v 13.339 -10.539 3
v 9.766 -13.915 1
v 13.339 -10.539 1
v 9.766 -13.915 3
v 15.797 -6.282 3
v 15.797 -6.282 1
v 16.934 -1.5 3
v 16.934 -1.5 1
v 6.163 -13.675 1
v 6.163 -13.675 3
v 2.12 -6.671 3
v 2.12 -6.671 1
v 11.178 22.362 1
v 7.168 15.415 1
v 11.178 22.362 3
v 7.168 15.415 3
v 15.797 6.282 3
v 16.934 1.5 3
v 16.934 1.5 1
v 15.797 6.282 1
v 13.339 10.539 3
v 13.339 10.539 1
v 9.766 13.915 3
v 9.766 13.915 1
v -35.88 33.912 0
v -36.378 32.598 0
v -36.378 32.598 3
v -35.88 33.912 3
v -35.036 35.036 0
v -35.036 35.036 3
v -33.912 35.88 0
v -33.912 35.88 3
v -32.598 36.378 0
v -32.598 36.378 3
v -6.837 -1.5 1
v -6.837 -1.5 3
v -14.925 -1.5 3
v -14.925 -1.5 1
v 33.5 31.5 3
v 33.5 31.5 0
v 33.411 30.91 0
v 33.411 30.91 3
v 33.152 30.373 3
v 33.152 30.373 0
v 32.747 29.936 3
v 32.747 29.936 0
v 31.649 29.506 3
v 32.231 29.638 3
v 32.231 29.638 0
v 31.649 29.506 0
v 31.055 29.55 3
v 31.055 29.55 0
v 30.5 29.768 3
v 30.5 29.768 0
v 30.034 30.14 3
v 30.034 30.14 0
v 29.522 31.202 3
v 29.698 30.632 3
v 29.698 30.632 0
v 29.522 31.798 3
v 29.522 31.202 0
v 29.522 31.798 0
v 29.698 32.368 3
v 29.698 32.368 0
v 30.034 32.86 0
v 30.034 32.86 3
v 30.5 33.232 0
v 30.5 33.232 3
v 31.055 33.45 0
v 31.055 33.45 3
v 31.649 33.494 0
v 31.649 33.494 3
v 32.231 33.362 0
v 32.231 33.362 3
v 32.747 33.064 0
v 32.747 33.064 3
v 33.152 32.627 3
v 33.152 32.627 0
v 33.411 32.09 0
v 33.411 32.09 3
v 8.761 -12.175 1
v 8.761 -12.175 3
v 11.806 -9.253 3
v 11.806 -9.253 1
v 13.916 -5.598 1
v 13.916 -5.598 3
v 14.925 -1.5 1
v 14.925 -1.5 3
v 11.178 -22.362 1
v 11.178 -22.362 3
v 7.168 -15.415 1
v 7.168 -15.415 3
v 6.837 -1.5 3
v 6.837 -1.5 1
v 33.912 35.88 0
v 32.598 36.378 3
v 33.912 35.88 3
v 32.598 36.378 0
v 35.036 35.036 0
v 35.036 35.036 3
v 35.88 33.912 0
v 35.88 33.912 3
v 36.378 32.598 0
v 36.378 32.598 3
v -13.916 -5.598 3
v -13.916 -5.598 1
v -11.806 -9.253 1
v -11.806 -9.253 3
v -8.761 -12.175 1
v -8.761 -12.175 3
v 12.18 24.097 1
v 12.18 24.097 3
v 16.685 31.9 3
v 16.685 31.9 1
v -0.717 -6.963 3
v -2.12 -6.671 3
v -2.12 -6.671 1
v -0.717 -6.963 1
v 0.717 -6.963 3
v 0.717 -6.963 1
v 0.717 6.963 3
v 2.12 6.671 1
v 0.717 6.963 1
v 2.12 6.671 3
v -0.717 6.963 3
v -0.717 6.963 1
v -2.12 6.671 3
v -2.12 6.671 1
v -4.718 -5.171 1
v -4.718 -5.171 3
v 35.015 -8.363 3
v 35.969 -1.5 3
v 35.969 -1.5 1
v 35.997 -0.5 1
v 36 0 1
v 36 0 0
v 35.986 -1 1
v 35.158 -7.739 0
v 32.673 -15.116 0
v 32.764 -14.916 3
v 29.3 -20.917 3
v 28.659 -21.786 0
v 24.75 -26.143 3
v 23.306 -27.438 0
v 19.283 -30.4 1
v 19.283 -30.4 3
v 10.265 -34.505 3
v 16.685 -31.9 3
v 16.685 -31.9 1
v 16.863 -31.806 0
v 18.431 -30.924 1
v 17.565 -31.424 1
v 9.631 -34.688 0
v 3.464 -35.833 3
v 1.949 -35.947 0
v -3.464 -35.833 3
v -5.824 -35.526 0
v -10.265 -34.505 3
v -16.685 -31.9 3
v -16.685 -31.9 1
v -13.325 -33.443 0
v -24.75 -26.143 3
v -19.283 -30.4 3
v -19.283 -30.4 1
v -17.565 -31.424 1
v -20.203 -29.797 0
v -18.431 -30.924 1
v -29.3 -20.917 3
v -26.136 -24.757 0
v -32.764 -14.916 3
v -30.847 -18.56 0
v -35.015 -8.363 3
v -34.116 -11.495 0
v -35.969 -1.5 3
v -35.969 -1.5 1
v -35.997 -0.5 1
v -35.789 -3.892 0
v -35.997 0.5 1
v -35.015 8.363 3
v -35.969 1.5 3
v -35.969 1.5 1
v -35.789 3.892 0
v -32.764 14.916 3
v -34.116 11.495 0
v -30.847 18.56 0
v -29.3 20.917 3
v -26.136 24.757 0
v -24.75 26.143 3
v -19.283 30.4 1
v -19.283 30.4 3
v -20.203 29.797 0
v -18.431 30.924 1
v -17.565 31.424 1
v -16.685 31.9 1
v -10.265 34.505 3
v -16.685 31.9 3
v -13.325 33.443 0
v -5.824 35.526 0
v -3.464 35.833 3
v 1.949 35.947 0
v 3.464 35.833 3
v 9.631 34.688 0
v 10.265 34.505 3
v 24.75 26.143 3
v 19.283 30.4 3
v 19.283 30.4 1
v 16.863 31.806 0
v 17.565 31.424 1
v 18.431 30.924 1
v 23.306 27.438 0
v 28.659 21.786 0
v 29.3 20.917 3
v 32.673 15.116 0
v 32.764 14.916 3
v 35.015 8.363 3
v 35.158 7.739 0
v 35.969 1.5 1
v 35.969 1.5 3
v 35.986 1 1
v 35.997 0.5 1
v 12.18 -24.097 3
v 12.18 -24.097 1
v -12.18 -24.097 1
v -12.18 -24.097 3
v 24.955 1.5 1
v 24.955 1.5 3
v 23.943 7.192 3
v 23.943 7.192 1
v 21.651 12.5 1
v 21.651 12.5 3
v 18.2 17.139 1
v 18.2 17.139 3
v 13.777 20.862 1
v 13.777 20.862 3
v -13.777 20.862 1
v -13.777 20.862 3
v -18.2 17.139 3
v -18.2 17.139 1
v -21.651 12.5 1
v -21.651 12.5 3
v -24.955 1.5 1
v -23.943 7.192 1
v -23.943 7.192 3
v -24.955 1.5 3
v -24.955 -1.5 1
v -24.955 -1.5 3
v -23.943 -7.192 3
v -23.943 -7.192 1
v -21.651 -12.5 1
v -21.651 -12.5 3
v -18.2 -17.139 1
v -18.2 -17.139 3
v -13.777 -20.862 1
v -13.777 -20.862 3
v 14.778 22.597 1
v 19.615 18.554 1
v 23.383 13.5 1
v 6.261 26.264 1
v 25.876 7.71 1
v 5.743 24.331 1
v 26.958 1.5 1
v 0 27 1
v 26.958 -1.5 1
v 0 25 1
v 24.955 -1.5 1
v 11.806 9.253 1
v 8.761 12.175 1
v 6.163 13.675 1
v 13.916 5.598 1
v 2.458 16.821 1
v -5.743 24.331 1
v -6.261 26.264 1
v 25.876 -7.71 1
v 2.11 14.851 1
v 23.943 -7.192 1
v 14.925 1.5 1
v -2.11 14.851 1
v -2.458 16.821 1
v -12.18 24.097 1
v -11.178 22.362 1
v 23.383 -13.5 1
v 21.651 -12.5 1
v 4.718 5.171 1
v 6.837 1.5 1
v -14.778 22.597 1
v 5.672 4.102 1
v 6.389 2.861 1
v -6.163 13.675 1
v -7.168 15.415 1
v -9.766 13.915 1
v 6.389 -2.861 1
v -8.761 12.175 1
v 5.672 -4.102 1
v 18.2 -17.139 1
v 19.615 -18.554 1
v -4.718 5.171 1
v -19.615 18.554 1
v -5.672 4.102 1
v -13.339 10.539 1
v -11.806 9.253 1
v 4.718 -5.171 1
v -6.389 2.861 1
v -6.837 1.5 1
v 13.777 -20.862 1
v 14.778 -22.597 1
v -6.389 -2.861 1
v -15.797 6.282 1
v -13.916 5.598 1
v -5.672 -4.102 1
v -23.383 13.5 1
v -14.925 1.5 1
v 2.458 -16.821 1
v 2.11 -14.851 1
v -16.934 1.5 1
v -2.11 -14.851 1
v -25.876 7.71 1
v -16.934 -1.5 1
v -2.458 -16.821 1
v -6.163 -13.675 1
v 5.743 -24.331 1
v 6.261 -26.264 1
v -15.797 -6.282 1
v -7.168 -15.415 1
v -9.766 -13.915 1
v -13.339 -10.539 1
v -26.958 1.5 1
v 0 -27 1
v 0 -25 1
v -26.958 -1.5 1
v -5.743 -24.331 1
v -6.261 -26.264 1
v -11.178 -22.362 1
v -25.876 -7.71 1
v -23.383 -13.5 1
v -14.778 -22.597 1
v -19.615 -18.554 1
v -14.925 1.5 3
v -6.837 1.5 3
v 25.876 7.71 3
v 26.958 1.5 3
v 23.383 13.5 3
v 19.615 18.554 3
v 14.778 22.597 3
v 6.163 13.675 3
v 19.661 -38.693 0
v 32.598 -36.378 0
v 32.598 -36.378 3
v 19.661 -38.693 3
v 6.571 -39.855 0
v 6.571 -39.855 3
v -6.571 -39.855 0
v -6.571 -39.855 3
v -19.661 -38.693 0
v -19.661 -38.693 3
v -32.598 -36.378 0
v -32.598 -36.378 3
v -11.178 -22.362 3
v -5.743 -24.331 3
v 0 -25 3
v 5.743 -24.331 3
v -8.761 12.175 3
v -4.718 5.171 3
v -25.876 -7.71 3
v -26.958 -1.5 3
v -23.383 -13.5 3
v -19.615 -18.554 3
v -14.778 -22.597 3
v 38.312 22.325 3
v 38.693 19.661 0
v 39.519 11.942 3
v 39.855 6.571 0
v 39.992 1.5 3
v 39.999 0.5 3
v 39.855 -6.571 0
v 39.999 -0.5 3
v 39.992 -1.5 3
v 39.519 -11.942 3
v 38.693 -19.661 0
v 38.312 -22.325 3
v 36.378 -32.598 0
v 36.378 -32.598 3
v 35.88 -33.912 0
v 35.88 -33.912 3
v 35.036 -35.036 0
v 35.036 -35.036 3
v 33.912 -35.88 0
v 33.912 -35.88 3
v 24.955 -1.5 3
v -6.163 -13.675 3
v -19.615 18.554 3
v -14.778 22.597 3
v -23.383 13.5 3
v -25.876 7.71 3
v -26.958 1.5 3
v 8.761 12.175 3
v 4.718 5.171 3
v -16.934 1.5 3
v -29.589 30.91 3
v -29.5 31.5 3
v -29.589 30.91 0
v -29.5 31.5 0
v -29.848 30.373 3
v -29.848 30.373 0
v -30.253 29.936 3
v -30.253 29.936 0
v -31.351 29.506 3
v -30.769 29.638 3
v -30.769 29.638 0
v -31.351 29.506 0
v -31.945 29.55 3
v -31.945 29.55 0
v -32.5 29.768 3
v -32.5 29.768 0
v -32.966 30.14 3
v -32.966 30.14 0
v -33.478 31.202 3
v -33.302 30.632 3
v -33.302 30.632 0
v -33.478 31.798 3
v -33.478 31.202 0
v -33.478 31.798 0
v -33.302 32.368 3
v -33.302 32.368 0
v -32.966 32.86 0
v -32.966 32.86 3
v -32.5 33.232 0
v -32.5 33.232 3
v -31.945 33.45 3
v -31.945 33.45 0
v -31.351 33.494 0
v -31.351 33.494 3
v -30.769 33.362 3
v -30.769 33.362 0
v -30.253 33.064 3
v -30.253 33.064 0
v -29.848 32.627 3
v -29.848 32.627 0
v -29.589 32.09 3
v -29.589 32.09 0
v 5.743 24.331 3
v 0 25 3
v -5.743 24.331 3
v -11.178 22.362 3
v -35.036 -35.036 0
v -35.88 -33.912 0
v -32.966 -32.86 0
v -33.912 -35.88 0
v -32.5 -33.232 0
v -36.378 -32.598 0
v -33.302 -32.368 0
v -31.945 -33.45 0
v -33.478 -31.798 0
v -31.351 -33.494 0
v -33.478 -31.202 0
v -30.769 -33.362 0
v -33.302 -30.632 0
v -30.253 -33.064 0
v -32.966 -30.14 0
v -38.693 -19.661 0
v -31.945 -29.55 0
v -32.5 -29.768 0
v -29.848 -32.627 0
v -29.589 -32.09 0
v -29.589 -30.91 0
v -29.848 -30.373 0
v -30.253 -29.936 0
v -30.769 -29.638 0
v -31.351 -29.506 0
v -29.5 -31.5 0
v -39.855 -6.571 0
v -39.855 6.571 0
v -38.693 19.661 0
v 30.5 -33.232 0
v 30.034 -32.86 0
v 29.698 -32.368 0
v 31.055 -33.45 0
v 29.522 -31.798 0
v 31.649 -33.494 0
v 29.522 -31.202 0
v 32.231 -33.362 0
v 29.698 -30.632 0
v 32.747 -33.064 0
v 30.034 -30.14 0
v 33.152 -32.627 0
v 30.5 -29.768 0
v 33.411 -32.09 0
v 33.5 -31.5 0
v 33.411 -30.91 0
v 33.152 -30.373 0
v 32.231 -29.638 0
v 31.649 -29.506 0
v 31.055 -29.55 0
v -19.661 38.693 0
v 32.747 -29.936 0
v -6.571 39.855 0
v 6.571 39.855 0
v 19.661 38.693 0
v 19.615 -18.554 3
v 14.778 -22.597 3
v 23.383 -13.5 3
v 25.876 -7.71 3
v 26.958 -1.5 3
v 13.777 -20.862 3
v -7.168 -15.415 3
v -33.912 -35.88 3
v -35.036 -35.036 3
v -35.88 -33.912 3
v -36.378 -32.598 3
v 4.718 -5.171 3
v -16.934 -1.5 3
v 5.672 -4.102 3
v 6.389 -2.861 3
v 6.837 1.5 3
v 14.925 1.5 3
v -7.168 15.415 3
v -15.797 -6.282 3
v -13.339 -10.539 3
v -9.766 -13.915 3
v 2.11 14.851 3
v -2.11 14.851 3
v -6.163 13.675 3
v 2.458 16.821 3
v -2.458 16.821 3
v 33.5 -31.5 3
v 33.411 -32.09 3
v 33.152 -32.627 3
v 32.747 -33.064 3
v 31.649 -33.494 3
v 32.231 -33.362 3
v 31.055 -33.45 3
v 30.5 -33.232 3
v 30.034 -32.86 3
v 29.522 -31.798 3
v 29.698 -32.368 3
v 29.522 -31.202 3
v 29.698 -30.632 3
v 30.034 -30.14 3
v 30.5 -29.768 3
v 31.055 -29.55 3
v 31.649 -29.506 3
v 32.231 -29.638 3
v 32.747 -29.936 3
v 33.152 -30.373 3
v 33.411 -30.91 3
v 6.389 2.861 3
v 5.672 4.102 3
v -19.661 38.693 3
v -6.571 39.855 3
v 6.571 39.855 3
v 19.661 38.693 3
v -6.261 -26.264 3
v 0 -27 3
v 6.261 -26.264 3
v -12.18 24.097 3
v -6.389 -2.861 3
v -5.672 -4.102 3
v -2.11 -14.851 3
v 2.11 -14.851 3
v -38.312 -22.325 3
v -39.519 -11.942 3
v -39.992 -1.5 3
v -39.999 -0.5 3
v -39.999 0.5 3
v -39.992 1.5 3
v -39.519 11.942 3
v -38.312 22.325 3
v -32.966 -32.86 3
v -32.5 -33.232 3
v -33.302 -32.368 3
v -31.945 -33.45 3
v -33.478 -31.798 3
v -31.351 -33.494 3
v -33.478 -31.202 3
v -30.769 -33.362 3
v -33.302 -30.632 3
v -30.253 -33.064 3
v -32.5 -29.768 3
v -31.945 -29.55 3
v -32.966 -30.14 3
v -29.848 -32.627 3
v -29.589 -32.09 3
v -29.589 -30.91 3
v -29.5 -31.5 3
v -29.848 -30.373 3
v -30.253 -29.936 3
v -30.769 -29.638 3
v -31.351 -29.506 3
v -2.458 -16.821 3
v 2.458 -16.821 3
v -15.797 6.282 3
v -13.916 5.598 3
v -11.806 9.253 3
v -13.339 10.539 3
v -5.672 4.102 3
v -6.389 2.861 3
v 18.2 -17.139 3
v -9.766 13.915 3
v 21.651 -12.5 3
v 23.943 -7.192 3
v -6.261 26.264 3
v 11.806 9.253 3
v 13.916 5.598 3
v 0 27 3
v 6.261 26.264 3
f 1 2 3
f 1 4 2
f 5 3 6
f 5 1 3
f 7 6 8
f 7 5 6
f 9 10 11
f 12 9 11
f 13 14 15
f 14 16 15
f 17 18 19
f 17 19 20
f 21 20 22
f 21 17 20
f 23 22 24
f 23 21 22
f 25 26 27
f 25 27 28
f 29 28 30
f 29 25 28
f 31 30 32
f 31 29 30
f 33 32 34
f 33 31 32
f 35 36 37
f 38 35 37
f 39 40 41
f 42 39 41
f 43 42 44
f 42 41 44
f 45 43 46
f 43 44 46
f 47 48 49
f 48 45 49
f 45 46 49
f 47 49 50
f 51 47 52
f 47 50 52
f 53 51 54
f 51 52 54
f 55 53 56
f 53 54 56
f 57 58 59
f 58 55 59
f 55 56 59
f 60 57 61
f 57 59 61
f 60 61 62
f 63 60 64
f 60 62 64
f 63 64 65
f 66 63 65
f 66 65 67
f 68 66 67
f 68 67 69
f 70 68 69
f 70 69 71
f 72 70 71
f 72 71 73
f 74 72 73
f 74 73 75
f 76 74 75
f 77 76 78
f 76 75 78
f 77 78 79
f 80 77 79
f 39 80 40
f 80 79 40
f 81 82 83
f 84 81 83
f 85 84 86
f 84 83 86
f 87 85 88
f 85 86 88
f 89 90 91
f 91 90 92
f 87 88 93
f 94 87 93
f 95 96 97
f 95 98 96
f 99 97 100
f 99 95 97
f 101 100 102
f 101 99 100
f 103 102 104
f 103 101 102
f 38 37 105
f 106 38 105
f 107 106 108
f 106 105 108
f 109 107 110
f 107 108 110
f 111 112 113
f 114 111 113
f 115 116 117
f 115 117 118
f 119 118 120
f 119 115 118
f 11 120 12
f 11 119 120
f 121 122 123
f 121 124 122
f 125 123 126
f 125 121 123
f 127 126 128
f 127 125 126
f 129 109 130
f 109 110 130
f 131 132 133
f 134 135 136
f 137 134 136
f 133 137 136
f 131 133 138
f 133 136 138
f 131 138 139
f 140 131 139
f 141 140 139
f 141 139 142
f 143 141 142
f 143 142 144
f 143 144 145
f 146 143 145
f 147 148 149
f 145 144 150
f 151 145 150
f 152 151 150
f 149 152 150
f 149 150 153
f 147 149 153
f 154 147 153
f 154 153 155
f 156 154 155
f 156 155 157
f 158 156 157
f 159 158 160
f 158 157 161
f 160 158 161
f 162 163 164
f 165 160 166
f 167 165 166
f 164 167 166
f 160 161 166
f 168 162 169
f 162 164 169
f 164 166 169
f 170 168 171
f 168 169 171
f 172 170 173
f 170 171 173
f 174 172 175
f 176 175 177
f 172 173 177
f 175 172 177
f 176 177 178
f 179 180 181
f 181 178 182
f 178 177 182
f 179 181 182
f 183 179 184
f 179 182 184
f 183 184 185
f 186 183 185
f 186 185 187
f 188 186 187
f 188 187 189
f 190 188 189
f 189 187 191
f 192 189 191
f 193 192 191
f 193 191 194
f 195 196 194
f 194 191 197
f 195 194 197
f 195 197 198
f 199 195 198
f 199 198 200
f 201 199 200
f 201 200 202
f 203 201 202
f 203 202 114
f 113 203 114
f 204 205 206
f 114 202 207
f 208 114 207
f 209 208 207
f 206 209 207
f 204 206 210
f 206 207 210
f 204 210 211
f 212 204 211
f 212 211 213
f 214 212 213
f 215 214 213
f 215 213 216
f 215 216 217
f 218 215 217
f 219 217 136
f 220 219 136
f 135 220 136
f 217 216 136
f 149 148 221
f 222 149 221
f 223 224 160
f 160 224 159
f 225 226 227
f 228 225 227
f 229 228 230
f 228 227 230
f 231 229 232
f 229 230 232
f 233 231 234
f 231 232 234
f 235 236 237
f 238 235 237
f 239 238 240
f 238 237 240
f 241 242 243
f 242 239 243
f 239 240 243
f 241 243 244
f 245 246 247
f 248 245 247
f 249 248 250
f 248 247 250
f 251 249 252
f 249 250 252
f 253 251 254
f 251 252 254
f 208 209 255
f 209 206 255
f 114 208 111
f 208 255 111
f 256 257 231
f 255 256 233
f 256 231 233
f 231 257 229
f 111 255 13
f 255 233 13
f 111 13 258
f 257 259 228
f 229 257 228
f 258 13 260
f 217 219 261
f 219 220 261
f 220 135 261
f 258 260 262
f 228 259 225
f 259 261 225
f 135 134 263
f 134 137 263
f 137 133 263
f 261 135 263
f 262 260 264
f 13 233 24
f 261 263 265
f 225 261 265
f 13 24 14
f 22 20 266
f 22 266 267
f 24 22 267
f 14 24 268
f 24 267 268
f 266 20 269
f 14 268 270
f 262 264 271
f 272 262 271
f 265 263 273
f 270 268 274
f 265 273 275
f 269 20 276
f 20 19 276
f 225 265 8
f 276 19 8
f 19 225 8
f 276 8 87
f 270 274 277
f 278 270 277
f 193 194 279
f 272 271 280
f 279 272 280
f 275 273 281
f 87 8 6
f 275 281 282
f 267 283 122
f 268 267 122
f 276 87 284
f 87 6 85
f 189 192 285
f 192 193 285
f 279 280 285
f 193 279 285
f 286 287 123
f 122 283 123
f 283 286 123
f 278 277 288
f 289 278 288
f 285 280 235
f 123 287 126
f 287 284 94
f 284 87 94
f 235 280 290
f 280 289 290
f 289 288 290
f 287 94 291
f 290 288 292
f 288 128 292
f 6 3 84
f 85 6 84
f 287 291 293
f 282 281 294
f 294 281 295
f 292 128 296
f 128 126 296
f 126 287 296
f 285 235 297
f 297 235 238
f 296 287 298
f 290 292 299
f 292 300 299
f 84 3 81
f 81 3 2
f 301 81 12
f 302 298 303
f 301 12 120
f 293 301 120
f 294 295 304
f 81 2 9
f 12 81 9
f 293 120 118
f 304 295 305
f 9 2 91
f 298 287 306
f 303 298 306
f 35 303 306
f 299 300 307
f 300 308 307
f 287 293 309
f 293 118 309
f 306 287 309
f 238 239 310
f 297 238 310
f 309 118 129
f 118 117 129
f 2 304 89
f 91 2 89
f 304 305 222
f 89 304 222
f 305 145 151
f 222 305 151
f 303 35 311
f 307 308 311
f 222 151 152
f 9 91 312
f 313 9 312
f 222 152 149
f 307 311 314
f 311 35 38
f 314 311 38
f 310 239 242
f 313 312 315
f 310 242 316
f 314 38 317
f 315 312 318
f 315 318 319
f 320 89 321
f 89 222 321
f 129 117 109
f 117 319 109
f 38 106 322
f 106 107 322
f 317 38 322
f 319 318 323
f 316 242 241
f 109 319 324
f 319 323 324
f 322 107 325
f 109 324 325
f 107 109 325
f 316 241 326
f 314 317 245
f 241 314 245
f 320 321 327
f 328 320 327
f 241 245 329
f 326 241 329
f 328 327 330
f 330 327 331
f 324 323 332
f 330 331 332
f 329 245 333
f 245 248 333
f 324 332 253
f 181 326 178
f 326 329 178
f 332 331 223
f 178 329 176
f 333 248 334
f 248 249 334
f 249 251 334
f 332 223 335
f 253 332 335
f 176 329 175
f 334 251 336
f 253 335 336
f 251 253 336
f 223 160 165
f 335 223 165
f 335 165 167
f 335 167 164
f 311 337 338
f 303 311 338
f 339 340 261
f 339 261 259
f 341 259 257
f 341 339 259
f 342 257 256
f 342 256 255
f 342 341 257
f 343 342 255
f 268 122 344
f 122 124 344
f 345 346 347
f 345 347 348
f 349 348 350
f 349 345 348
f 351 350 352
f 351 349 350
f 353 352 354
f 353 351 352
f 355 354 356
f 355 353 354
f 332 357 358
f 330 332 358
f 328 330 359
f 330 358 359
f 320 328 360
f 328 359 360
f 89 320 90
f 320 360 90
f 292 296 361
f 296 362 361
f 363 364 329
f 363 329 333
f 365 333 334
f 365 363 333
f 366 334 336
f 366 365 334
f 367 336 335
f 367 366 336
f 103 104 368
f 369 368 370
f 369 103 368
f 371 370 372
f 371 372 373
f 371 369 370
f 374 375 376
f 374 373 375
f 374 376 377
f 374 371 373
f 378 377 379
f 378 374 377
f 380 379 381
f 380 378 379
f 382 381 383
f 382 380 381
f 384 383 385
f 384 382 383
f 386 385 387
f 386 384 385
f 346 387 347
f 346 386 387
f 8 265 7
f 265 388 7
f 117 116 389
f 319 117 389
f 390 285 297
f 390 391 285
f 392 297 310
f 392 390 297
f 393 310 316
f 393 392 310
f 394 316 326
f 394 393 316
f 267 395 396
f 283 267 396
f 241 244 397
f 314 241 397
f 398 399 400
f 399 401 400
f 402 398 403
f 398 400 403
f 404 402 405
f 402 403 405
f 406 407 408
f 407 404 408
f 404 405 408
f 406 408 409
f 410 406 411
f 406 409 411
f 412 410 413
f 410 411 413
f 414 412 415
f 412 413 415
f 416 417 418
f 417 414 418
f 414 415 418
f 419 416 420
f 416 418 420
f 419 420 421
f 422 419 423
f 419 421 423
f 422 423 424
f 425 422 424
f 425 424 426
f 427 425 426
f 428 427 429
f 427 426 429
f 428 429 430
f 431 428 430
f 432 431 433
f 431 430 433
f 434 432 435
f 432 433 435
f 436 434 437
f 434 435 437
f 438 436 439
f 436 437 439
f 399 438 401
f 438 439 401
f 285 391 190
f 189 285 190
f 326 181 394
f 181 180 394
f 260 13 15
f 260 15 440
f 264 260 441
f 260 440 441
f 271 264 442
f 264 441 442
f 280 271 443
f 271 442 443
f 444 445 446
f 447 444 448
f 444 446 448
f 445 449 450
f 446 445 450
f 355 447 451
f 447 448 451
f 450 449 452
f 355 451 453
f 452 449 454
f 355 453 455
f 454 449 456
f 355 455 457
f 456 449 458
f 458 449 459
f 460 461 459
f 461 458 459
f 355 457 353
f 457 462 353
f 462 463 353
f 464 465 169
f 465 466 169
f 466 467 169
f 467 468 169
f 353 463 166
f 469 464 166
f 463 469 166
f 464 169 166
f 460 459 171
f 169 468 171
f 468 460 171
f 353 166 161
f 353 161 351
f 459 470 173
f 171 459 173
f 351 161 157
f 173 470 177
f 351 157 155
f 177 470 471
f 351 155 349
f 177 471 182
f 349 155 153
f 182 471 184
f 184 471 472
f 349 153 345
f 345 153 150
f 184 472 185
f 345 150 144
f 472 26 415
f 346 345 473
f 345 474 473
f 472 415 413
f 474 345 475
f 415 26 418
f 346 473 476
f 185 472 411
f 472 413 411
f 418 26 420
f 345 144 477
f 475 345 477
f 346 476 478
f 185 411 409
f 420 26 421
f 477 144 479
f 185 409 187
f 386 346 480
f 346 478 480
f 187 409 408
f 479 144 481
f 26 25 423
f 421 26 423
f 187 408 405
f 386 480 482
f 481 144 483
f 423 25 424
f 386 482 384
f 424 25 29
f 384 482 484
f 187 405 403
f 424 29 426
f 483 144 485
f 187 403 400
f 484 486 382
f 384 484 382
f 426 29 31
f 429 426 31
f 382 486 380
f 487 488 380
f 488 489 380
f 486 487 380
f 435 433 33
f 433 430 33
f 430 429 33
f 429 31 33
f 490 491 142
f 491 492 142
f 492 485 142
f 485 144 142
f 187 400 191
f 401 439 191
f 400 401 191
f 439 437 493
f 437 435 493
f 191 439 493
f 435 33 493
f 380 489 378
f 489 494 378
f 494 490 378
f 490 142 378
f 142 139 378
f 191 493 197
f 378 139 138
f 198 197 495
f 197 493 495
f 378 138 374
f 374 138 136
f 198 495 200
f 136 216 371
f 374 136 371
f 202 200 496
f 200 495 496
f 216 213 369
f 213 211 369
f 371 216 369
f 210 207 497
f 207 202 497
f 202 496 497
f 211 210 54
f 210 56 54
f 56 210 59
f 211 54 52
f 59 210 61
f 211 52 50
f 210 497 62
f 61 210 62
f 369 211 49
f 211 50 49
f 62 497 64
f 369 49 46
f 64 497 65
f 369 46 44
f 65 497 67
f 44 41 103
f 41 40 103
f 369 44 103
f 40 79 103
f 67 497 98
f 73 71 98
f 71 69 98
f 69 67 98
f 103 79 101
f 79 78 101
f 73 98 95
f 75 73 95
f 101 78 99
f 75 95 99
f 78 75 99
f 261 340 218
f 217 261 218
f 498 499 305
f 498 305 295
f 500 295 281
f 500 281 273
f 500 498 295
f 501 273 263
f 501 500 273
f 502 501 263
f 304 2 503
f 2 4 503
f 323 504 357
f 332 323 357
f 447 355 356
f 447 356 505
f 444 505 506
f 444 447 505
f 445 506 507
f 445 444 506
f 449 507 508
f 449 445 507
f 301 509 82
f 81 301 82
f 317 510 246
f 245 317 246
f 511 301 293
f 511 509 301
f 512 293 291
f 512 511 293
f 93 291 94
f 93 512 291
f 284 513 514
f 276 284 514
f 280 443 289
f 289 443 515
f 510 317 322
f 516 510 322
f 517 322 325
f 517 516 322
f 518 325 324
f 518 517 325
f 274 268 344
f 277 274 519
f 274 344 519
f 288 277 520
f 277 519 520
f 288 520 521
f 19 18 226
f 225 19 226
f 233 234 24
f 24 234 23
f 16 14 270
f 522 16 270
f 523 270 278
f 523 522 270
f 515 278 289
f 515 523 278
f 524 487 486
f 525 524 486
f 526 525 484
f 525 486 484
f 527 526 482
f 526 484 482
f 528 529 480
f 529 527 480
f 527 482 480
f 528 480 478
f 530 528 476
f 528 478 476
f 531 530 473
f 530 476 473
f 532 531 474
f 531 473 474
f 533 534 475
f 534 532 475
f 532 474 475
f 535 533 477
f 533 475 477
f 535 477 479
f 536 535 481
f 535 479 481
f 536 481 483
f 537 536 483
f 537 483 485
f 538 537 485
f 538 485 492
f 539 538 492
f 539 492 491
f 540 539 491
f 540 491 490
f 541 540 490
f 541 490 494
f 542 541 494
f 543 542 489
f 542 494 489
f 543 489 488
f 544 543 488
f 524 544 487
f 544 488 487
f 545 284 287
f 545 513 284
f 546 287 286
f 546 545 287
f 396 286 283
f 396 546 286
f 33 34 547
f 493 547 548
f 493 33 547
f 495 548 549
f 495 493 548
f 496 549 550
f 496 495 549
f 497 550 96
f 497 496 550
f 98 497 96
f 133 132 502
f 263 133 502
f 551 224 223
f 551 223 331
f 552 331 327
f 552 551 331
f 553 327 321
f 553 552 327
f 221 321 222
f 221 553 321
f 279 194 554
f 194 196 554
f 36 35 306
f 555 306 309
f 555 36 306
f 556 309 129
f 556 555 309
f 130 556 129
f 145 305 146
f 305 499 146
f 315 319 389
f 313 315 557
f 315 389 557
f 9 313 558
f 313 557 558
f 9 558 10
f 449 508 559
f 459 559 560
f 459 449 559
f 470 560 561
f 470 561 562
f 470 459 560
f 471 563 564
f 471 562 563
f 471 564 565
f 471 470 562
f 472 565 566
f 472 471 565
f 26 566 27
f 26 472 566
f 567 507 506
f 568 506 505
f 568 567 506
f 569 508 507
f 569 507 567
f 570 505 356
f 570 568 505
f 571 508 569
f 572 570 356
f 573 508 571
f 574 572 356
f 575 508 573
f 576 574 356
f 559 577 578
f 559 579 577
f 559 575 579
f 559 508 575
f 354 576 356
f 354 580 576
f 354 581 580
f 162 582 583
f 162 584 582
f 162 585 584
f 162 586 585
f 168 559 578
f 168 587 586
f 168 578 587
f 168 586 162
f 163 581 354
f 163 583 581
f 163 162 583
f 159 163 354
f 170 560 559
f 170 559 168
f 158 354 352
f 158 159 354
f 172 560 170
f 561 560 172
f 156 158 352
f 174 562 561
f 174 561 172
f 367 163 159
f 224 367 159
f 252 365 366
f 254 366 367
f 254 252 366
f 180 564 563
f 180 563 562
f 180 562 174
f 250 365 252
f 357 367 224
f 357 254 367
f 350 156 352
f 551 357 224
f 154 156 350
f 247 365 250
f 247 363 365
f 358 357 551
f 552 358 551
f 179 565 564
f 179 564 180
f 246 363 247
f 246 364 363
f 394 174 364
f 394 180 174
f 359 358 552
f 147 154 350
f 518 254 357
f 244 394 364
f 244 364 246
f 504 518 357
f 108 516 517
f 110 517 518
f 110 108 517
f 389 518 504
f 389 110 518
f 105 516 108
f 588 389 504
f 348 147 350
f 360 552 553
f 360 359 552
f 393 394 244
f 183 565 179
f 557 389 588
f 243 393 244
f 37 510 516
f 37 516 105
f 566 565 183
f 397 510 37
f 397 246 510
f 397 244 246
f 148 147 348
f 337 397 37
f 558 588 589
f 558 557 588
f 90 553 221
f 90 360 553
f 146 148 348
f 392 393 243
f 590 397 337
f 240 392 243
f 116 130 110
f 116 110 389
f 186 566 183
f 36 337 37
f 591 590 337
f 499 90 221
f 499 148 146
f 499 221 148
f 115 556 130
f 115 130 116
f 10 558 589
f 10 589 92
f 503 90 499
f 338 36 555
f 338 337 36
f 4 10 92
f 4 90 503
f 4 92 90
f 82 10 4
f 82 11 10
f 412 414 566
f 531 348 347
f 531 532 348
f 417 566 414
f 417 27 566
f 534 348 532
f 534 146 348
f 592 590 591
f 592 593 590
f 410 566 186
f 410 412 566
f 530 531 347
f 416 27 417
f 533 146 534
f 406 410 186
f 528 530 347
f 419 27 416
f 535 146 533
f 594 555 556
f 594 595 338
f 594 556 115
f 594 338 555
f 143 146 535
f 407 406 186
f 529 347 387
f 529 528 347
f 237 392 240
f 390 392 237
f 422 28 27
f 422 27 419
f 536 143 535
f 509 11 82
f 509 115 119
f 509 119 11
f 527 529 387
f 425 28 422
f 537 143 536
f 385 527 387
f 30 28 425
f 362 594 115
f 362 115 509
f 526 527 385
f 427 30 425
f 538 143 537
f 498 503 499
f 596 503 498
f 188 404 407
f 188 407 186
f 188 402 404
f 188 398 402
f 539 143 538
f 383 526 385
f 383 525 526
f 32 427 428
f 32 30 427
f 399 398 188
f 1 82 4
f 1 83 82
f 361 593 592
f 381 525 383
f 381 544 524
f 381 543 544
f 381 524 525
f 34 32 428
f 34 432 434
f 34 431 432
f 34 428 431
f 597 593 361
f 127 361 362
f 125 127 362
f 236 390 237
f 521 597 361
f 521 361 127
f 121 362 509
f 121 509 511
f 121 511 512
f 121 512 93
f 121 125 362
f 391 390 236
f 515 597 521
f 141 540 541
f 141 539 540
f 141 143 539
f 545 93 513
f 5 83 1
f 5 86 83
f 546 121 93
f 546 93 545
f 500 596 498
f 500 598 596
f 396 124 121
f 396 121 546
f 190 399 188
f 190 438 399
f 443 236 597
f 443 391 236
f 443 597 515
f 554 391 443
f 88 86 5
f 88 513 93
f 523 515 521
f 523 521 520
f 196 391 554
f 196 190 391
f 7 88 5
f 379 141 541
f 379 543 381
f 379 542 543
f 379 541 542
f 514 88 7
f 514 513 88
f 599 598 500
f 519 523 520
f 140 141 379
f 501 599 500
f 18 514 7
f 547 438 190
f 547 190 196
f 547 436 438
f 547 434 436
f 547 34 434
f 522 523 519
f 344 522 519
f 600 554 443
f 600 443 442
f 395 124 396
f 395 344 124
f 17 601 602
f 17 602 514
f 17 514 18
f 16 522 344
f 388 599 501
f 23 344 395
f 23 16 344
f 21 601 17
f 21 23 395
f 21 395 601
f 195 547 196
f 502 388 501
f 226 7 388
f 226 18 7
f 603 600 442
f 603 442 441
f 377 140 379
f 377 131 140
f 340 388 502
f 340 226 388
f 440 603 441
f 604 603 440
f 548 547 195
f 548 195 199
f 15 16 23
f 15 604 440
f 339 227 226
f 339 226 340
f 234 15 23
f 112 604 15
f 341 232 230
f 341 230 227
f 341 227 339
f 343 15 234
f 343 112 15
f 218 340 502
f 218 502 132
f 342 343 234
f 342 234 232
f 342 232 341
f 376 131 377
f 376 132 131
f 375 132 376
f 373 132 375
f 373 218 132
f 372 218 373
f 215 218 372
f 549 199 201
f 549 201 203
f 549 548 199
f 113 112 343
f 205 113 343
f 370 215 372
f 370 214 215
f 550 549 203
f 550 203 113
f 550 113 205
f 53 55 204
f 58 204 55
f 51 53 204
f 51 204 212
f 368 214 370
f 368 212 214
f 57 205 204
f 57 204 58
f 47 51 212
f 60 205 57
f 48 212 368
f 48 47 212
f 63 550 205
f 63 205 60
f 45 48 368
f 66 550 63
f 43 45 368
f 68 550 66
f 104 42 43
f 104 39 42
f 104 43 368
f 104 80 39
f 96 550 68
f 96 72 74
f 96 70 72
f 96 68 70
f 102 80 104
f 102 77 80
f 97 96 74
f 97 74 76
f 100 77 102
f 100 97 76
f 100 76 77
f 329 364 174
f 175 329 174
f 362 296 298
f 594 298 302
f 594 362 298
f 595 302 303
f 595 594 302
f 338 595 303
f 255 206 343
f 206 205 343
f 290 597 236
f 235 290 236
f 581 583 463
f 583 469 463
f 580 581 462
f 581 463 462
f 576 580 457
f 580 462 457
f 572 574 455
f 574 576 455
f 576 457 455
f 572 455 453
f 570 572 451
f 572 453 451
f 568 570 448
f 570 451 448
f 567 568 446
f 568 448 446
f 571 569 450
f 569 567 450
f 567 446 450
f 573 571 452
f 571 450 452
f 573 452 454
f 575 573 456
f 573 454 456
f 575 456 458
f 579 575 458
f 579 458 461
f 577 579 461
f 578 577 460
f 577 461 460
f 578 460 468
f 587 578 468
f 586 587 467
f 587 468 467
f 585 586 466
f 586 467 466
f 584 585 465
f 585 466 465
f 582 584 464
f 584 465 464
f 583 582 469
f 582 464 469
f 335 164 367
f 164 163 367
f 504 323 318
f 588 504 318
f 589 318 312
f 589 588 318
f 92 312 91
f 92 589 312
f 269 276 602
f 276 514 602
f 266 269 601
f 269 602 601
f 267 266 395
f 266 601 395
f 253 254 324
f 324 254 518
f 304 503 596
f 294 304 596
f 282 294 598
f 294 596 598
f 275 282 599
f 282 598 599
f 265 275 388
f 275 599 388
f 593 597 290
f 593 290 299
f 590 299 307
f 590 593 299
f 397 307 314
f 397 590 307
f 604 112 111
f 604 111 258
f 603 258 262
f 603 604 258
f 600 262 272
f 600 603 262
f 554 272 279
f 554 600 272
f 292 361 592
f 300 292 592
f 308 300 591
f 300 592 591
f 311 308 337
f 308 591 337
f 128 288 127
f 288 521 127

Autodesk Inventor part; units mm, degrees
ref_plane "YZ Plane" through (0, 0, 0) normal (1, 0, 0) x (0, 1, 0)
ref_plane "XZ Plane" through (0, 0, 0) normal (0, 1, 0) x (-1, 0, 0)
ref_plane "XY Plane" through (0, 0, 0) normal (0, 0, 1) x (1, 0, 0)
sketch "Эскиз1" plane through (0, 0, 0) normal (0, 0, 1) x (1, 0, 0)
  line L0 (-31.5, 31.5) -> (31.5, 31.5) construction
  line L1 (31.5, 31.5) -> (31.5, -31.5) construction
  line L2 (31.5, -31.5) -> (-31.5, -31.5) construction
  line L3 (-31.5, -31.5) -> (-31.5, 31.5) construction
  arc A0 (-32.5976, 36.378) -> (-36.378, 32.5976) centre (-31.5, 31.5) ccw
  line L4 (-40, 40) -> (40, 40) construction
  line L5 (40, 40) -> (40, -40) construction
  line L6 (40, -40) -> (-40, -40) construction
  line L7 (-40, -40) -> (-40, 40) construction
  arc A1 (-36.378, 32.5976) -> (-36.378, -32.5976) centre (108.5, 0) ccw
  line L8 (-40, 0) -> (40, 0)
  line L9 (0, 40) -> (0, -40)
  arc A2 (32.5976, 36.378) -> (-32.5976, 36.378) centre (0, -108.5) ccw
  arc A3 (36.378, 32.5976) -> (32.5976, 36.378) centre (31.5, 31.5) ccw
  arc A4 (-36.378, -32.5976) -> (-32.5976, -36.378) centre (-31.5, -31.5) ccw
  arc A5 (-32.5976, -36.378) -> (32.5976, -36.378) centre (0, 108.5) ccw
  arc A6 (36.378, -32.5976) -> (36.378, 32.5976) centre (-108.5, 0) ccw
  circle A7 centre (0, 0) radius 36
  circle A8 centre (-31.5, 31.5) radius 2
  circle A9 centre (31.5, 31.5) radius 2
  circle A10 centre (31.5, -31.5) radius 2
  circle A11 centre (-31.5, -31.5) radius 2
  arc A12 (32.5976, -36.378) -> (36.378, -32.5976) centre (31.5, -31.5) ccw
  point P0 (0, 31.5)
  point P1 (31.5, 0)
  dimension "d0" = 63
  dimension "d1" = 5
  dimension "d2" = 80
  dimension "d3" = 72
  dimension "d4" = 4
extrude "Выдавливание1" add sketch "Эскиз1" along normal blind 3 contours A2 L9 A7 L8 A1 A0 | A2 A3 A6 L8 A7 L9 | L8 A7 L9 A5 A4 A1 | L8 A6 A12 A5 L9 A7
sketch "Эскиз2" plane through (0, 0, 3) normal (0, 0, 1) x (1, 0, 0)
  circle A0 centre (0, 0) radius 5
  circle A1 centre (0, 0) radius 7
  circle A2 centre (0, 0) radius 15
  circle A3 centre (0, 0) radius 17
  circle A4 centre (0, 0) radius 27
  circle A5 centre (0, 0) radius 25
  circle A6 centre (0, 0) radius 36 projected
  dimension "d7" = 2
  dimension "d8" = 2
  dimension "d9" = 2
  dimension "d10" = 10
  dimension "d11" = 30
  dimension "d12" = 50
extrude "Выдавливание2" add sketch "Эскиз2" against normal blind 2 contours A1 | A3 | A4
sketch "Эскиз3" plane through (0, 0, 3) normal (0, 0, 1) x (1, 0, 0)
  line L0 (-39.9924, 1.5) -> (-6.8374, 1.5)
  line L1 (-6.8374, 1.5) -> (-6.8374, -1.5)
  line L2 (-6.8374, -1.5) -> (-39.9924, -1.5)
  line L3 (-39.9924, -1.5) -> (-39.9924, 1.5)
  circle A0 centre (0, 0) radius 7 projected
  arc A1 (-36.378, 32.5976) -> (-36.378, -32.5976) centre (108.5, 0) ccw projected
  dimension "d15" = 3
extrude "Выдавливание3" add sketch "Эскиз3" against normal blind 2 contours L0 A0 L2 L3 | A0 L1 | L1 A0
pattern_circular "Круговой массив1" count 6 over 360 about axis through (0, 0, -10) along (0, 0, 1) of "Выдавливание3"
properties part number "Speaker_Secure"
